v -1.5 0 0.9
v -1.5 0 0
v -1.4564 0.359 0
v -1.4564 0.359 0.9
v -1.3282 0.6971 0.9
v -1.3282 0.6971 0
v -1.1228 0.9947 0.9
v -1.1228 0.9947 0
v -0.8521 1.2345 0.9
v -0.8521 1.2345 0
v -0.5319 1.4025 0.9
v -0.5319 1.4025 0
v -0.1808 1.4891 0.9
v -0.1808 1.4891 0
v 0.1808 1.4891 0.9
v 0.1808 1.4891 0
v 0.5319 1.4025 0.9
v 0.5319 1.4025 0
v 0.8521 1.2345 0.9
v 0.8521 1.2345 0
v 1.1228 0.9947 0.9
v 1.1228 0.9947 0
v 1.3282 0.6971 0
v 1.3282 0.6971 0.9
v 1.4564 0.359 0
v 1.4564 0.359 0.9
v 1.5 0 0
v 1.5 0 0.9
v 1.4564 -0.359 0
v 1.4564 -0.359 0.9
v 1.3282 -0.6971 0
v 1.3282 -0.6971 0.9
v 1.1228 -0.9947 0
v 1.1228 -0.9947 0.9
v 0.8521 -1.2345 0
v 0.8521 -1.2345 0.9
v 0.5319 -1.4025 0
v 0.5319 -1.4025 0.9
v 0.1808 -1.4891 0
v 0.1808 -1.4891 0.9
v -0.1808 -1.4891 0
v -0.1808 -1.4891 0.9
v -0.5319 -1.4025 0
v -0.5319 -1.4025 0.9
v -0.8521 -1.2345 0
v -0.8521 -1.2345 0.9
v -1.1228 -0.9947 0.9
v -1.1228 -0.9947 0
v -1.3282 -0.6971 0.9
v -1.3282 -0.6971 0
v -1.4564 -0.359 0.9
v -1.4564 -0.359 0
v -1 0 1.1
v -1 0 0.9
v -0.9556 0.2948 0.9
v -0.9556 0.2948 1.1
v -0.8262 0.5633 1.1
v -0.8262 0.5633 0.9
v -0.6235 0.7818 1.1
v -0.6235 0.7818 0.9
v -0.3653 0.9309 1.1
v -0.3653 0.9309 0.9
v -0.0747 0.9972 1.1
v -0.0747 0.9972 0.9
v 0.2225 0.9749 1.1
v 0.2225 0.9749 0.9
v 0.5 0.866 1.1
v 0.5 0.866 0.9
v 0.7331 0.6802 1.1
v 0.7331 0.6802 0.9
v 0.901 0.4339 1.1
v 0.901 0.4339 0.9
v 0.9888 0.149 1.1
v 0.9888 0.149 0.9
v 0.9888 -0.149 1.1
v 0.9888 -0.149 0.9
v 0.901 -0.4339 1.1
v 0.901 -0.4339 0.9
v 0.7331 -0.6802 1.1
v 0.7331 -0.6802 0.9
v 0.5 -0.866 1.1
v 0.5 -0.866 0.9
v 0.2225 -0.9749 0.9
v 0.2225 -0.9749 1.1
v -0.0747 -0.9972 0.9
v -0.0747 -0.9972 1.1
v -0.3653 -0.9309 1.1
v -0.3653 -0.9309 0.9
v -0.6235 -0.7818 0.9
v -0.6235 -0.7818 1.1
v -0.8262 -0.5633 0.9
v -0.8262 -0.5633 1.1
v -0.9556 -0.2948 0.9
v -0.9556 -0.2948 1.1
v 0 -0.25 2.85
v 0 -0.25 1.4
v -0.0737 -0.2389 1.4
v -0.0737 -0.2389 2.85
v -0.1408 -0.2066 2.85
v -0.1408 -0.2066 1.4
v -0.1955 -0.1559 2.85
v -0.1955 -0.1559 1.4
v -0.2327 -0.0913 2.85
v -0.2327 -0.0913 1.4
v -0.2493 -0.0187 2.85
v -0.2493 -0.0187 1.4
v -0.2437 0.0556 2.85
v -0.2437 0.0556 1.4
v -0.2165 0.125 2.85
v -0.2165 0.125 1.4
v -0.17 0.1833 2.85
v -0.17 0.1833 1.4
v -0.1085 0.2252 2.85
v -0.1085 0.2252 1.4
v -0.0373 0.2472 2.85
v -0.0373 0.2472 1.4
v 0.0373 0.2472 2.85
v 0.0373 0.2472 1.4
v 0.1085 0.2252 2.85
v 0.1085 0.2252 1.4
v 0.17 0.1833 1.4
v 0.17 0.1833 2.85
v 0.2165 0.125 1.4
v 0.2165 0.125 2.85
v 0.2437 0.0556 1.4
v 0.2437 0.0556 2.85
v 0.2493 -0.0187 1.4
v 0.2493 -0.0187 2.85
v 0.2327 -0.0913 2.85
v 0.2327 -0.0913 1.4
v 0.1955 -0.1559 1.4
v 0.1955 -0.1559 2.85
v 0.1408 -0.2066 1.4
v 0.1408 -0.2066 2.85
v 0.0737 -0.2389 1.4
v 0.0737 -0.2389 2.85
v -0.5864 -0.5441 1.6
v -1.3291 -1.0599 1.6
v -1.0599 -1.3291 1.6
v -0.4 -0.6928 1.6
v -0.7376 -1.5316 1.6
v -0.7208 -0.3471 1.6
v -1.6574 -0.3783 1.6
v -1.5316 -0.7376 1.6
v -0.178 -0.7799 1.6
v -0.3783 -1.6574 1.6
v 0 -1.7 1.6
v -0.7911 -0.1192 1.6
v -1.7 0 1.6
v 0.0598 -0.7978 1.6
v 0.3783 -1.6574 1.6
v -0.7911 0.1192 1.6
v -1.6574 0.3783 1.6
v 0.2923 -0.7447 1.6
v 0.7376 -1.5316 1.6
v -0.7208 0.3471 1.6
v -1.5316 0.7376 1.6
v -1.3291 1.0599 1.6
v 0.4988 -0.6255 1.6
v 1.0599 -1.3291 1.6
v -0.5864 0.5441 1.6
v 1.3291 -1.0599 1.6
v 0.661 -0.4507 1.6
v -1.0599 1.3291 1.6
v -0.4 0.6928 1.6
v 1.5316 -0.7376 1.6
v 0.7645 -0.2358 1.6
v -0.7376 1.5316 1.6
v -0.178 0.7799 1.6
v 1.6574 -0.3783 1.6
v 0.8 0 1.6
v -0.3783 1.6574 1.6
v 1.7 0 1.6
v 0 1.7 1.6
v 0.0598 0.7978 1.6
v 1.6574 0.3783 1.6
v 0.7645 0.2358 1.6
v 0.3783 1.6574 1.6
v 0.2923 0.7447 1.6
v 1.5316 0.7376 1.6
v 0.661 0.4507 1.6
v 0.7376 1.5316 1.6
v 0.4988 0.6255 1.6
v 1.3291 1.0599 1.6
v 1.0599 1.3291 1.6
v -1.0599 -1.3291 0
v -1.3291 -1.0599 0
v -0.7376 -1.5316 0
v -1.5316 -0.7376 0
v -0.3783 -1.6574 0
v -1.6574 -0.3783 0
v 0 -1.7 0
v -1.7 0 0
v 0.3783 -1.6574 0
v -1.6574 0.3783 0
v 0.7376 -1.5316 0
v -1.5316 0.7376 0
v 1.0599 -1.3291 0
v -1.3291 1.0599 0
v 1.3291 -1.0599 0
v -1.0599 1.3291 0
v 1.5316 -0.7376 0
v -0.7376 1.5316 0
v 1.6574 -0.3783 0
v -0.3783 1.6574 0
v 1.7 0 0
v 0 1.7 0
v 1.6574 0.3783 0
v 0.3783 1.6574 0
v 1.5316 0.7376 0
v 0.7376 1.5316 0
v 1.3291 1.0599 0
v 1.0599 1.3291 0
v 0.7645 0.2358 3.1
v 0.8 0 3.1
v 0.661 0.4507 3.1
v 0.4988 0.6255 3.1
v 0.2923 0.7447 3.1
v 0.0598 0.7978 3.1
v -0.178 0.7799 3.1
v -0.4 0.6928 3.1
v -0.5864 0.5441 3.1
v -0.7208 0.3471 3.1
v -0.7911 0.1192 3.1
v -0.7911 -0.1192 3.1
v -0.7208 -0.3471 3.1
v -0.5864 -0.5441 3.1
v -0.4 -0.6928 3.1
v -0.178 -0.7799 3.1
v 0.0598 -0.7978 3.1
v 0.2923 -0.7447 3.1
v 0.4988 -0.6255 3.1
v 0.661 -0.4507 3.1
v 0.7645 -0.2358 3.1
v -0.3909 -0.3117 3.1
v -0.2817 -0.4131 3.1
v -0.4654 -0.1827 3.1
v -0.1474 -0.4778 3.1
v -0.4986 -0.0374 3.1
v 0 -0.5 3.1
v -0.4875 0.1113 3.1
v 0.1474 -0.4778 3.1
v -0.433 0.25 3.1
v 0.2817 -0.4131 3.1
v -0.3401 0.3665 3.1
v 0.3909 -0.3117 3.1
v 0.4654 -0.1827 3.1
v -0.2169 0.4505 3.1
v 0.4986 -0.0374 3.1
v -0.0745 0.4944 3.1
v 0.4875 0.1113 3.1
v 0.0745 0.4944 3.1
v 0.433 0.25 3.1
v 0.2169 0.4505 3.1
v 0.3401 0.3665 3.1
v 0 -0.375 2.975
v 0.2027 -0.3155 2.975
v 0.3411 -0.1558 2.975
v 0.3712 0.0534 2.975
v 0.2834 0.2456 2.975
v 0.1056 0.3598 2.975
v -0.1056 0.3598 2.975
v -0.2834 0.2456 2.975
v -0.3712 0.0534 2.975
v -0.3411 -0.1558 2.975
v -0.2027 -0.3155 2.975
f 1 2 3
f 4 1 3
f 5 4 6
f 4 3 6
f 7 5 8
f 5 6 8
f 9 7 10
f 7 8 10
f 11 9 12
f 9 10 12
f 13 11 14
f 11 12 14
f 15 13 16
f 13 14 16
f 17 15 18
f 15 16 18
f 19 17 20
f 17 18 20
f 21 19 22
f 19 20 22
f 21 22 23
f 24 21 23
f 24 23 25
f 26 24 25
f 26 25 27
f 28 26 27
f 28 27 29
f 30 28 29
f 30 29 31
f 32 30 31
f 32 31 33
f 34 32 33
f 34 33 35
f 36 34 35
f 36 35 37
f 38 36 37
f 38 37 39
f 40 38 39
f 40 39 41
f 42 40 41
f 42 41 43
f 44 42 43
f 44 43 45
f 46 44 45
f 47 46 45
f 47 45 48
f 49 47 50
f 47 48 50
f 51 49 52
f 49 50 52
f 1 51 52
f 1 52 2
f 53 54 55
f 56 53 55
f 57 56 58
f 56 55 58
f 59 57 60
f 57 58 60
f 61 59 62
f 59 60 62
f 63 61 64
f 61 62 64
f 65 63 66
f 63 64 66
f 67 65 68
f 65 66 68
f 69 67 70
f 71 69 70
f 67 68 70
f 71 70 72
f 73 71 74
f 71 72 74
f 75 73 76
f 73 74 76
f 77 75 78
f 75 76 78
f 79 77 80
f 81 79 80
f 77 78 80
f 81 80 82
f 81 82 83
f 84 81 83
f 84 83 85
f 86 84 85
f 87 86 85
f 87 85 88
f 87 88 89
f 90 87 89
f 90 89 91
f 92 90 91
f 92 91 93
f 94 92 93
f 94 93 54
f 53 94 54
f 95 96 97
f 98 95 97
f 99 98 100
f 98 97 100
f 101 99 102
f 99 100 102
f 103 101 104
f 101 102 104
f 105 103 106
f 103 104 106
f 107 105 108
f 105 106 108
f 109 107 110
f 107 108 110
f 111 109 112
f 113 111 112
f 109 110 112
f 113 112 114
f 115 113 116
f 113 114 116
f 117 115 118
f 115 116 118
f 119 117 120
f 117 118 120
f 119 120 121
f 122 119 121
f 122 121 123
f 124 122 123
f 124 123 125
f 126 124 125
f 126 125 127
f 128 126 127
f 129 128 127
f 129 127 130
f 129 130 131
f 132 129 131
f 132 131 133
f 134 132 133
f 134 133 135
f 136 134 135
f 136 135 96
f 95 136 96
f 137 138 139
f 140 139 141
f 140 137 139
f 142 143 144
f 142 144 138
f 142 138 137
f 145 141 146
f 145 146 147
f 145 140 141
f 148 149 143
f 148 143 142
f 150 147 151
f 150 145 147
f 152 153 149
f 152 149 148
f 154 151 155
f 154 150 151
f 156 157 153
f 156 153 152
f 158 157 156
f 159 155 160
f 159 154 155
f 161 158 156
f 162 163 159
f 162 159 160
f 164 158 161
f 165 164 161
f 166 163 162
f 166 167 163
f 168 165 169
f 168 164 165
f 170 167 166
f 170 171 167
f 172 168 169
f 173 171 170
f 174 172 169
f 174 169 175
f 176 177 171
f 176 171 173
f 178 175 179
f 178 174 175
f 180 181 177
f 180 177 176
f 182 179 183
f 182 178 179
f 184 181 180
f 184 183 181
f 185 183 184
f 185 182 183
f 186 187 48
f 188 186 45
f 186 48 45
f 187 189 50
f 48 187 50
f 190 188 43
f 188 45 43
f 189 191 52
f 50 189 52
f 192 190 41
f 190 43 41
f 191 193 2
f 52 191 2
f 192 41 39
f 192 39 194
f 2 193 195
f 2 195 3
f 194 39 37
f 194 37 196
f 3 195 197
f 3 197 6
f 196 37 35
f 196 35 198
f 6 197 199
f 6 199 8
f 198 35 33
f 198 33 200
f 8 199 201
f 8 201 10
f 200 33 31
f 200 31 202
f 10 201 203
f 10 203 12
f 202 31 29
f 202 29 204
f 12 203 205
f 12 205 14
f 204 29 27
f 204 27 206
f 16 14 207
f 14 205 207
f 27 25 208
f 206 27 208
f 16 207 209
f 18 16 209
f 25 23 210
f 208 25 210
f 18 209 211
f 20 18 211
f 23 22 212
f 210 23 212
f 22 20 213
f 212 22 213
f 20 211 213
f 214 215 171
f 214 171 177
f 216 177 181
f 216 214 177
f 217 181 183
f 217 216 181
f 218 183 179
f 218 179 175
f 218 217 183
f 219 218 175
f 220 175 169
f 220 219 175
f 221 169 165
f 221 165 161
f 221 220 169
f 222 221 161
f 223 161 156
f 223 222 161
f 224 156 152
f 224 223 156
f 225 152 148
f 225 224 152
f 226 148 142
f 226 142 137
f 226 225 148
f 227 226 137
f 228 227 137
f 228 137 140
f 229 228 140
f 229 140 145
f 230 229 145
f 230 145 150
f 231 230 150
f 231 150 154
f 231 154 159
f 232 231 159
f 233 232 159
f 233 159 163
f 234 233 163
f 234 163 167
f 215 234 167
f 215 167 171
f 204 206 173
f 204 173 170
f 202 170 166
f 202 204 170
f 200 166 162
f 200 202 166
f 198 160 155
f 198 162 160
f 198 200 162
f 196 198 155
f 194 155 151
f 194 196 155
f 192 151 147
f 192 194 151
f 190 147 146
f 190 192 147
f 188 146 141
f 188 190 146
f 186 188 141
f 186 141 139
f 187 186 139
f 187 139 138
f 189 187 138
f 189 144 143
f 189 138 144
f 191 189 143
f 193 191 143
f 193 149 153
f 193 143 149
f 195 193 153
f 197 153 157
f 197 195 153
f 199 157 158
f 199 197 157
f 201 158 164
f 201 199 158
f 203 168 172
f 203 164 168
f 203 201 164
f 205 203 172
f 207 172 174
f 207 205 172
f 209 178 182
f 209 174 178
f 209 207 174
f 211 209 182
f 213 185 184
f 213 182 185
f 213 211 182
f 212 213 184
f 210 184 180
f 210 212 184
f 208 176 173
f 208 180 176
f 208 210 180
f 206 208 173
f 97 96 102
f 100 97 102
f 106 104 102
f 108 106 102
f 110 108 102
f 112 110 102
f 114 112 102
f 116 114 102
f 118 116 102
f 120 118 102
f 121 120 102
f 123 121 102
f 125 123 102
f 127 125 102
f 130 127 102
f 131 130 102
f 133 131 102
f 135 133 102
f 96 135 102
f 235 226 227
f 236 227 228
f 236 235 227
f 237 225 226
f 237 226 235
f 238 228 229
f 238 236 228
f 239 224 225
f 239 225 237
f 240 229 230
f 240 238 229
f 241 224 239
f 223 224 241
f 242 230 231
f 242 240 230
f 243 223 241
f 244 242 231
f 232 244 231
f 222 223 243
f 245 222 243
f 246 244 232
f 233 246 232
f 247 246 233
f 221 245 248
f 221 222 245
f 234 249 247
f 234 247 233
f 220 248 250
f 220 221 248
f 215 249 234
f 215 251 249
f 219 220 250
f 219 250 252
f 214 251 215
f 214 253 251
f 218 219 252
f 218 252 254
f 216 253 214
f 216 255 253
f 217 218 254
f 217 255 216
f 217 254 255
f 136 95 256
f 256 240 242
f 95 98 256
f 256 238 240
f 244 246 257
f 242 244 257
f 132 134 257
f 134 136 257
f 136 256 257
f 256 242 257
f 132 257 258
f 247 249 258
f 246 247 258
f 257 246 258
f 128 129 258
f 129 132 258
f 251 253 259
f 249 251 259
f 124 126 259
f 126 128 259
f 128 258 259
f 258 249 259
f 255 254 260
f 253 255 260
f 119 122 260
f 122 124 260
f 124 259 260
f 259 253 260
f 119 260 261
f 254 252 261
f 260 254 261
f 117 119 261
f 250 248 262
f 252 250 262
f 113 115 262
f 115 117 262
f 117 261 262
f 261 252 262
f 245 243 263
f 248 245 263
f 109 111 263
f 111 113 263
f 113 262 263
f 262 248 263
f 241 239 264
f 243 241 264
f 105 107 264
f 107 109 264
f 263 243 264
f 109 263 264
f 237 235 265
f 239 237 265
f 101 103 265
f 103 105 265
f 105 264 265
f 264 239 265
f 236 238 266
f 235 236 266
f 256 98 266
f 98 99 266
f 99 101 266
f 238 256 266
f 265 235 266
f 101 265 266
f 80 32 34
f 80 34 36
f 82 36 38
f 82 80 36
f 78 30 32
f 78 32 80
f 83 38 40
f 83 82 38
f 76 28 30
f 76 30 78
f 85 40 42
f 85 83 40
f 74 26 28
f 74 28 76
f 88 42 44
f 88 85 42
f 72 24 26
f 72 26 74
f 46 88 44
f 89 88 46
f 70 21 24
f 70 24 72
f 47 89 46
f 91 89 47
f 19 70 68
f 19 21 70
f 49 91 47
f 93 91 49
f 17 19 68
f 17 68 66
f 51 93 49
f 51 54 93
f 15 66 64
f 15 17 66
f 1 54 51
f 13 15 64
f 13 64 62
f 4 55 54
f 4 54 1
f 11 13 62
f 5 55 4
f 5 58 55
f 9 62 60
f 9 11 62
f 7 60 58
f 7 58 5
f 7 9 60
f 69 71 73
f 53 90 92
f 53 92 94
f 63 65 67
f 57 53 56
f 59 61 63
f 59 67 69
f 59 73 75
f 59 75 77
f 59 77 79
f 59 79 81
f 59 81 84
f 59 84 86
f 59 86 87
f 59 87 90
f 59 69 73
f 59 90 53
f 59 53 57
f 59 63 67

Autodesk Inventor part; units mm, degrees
ref_plane "YZ Plane" through (0, 0, 0) normal (1, 0, 0) x (0, 1, 0)
ref_plane "XZ Plane" through (0, 0, 0) normal (0, 1, 0) x (-1, 0, 0)
ref_plane "XY Plane" through (0, 0, 0) normal (0, 0, 1) x (1, 0, 0)
sketch "Sketch1" plane through (0, 0, 0) normal (0, 0, 1) x (1, 0, 0)
  circle A0 centre (0, 0) radius 1.7
  dimension "d0" = 3.4
extrude "Extrusion1" add sketch "Sketch1" along normal blind 3.1
sketch "Sketch2" plane through (0, 0, 3.1) normal (0, 0, 1) x (1, 0, 0)
  circle A0 centre (0, 0) radius 1.7 projected
  circle A1 centre (0, 0) radius 0.2
  dimension "d3" = 0.4
extrude "Extrusion2" [suppressed]
sketch "Sketch3" plane through (0, 0, 0) normal (0, 0, -1) x (-1, 0, 0)
  circle A0 centre (0, 0) radius 1.7 projected
  circle A1 centre (0, 0) radius 1.5
  dimension "d6" = 3
extrude "Extrusion3" cut sketch "Sketch3" against normal blind 0.9 contours A1
sketch "Sketch4" plane through (0, 0, 3.1) normal (0, 0, 1) x (1, 0, 0)
  circle A0 centre (0, 0) radius 1.7 projected
  circle A1 centre (0, 0) radius 0.8
  dimension "d9" = 1.6
extrude "Extrusion4" cut sketch "Sketch4" against normal blind 1.5
sketch "Sketch5" plane through (0, 0, 0.9) normal (0, 0, -1) x (-1, 0, 0)
  circle A0 centre (0, 0) radius 1.5 projected
  circle A1 centre (0, 0) radius 1.5 projected
  circle A2 centre (0, 0) radius 1.5 projected
  circle A3 centre (0, 0) radius 0.65
  dimension "d12" = 3
  dimension "d13" = 1.3
extrude "Extrusion5" [suppressed]
chamfer "Chamfer1" [suppressed]
hole "Hole1" at (0, 0, 3.1) direction (0, 0, -1) diameter 0.5 depth 1.7 countersink diameter 1 countersink angle 90
sketch "Sketch6" plane through (0, 0, 0.9) normal (0, 0, -1) x (-1, 0, 0)
  circle A0 centre (0, 0) radius 1.5 projected
  circle A1 centre (0, 0) radius 1.5 projected
  circle A2 centre (0, 0) radius 1
  dimension "d28" = 2
extrude "Extrusion6" cut sketch "Sketch6" against normal blind 0.2 contours A2
equation "\"baseInitD\" = 4"
equation "\"baseTh0\" = 48.463041deg"
equation "\"baseTh1\" = 23.073918deg"
equation "\"topD\" = 14"
equation "\"topInitD\" = 4"
equation "\"topTh0\" = 16.60155deg"
equation "\"topTh1\" = 86.796901deg"
equation "\"dFlexure\" = 0.38"
equation "\"lFlexure\" = 1.5"
equation "\"springBaseD\" = 8"
equation "\"dMotor\" = 1.44"
equation "\"springTopD\" = 8"
equation "\"springInitL\" = 12.7"
equation "\"lMotor\" = 22.35"
equation "\"topH\" = 21.66629"
equation "\"springL\" = 30.86629"
equation "\"springLset\" = 3.5"
equation "\"springDeform\" = 18.16629"
equation "\"springUnderCut\" = 9.2"
equation "\"spirngLO\" = 31.67176"
equation "\"springLO\" = 33.86629"
equation "\"lFlexureOffset\" = 1.95"
equation "\"dM2X\" = -1.34133"
equation "\"dM2Y\" = 7.00349"
equation "\"dM1Y\" = 2.34012"
equation "\"dM1X\" = 6.73587"
equation "\"dM1Yt\" = -0.43704"
equation "\"dM1Xt\" = 6.59227"
equation "\"dM2Xt\" = -3.67462"
equation "\"dM2Yt\" = 5.49055"
equation "\"GuideRod\" = 2"
equation "\"baseOD\" = 23"
equation "\"CSpringOD\" = 5.537"
equation "\"GuideTubingOD\" = 4"
equation "\"CSpringID\" = 5.029"
equation "\"CSpringCD\" = 0.254"
equation "\"GuideTubingID\" = 2"
equation "\"lOCTprobe\" = 1905"
equation "\"OCToffset\" = 365.252"
equation "\"lOCT\" = 1473.2"
equation "\"lOCTprobeNorm\" = 1838.452"
equation "\"lOCTprobeNom\" = 1838.452"
equation "\"OCTd0\" = 508"
equation "\"OCTd1\" = 254"
properties part number "MU_Bearing_Housing2" material "Aluminum-6061-AHC"
